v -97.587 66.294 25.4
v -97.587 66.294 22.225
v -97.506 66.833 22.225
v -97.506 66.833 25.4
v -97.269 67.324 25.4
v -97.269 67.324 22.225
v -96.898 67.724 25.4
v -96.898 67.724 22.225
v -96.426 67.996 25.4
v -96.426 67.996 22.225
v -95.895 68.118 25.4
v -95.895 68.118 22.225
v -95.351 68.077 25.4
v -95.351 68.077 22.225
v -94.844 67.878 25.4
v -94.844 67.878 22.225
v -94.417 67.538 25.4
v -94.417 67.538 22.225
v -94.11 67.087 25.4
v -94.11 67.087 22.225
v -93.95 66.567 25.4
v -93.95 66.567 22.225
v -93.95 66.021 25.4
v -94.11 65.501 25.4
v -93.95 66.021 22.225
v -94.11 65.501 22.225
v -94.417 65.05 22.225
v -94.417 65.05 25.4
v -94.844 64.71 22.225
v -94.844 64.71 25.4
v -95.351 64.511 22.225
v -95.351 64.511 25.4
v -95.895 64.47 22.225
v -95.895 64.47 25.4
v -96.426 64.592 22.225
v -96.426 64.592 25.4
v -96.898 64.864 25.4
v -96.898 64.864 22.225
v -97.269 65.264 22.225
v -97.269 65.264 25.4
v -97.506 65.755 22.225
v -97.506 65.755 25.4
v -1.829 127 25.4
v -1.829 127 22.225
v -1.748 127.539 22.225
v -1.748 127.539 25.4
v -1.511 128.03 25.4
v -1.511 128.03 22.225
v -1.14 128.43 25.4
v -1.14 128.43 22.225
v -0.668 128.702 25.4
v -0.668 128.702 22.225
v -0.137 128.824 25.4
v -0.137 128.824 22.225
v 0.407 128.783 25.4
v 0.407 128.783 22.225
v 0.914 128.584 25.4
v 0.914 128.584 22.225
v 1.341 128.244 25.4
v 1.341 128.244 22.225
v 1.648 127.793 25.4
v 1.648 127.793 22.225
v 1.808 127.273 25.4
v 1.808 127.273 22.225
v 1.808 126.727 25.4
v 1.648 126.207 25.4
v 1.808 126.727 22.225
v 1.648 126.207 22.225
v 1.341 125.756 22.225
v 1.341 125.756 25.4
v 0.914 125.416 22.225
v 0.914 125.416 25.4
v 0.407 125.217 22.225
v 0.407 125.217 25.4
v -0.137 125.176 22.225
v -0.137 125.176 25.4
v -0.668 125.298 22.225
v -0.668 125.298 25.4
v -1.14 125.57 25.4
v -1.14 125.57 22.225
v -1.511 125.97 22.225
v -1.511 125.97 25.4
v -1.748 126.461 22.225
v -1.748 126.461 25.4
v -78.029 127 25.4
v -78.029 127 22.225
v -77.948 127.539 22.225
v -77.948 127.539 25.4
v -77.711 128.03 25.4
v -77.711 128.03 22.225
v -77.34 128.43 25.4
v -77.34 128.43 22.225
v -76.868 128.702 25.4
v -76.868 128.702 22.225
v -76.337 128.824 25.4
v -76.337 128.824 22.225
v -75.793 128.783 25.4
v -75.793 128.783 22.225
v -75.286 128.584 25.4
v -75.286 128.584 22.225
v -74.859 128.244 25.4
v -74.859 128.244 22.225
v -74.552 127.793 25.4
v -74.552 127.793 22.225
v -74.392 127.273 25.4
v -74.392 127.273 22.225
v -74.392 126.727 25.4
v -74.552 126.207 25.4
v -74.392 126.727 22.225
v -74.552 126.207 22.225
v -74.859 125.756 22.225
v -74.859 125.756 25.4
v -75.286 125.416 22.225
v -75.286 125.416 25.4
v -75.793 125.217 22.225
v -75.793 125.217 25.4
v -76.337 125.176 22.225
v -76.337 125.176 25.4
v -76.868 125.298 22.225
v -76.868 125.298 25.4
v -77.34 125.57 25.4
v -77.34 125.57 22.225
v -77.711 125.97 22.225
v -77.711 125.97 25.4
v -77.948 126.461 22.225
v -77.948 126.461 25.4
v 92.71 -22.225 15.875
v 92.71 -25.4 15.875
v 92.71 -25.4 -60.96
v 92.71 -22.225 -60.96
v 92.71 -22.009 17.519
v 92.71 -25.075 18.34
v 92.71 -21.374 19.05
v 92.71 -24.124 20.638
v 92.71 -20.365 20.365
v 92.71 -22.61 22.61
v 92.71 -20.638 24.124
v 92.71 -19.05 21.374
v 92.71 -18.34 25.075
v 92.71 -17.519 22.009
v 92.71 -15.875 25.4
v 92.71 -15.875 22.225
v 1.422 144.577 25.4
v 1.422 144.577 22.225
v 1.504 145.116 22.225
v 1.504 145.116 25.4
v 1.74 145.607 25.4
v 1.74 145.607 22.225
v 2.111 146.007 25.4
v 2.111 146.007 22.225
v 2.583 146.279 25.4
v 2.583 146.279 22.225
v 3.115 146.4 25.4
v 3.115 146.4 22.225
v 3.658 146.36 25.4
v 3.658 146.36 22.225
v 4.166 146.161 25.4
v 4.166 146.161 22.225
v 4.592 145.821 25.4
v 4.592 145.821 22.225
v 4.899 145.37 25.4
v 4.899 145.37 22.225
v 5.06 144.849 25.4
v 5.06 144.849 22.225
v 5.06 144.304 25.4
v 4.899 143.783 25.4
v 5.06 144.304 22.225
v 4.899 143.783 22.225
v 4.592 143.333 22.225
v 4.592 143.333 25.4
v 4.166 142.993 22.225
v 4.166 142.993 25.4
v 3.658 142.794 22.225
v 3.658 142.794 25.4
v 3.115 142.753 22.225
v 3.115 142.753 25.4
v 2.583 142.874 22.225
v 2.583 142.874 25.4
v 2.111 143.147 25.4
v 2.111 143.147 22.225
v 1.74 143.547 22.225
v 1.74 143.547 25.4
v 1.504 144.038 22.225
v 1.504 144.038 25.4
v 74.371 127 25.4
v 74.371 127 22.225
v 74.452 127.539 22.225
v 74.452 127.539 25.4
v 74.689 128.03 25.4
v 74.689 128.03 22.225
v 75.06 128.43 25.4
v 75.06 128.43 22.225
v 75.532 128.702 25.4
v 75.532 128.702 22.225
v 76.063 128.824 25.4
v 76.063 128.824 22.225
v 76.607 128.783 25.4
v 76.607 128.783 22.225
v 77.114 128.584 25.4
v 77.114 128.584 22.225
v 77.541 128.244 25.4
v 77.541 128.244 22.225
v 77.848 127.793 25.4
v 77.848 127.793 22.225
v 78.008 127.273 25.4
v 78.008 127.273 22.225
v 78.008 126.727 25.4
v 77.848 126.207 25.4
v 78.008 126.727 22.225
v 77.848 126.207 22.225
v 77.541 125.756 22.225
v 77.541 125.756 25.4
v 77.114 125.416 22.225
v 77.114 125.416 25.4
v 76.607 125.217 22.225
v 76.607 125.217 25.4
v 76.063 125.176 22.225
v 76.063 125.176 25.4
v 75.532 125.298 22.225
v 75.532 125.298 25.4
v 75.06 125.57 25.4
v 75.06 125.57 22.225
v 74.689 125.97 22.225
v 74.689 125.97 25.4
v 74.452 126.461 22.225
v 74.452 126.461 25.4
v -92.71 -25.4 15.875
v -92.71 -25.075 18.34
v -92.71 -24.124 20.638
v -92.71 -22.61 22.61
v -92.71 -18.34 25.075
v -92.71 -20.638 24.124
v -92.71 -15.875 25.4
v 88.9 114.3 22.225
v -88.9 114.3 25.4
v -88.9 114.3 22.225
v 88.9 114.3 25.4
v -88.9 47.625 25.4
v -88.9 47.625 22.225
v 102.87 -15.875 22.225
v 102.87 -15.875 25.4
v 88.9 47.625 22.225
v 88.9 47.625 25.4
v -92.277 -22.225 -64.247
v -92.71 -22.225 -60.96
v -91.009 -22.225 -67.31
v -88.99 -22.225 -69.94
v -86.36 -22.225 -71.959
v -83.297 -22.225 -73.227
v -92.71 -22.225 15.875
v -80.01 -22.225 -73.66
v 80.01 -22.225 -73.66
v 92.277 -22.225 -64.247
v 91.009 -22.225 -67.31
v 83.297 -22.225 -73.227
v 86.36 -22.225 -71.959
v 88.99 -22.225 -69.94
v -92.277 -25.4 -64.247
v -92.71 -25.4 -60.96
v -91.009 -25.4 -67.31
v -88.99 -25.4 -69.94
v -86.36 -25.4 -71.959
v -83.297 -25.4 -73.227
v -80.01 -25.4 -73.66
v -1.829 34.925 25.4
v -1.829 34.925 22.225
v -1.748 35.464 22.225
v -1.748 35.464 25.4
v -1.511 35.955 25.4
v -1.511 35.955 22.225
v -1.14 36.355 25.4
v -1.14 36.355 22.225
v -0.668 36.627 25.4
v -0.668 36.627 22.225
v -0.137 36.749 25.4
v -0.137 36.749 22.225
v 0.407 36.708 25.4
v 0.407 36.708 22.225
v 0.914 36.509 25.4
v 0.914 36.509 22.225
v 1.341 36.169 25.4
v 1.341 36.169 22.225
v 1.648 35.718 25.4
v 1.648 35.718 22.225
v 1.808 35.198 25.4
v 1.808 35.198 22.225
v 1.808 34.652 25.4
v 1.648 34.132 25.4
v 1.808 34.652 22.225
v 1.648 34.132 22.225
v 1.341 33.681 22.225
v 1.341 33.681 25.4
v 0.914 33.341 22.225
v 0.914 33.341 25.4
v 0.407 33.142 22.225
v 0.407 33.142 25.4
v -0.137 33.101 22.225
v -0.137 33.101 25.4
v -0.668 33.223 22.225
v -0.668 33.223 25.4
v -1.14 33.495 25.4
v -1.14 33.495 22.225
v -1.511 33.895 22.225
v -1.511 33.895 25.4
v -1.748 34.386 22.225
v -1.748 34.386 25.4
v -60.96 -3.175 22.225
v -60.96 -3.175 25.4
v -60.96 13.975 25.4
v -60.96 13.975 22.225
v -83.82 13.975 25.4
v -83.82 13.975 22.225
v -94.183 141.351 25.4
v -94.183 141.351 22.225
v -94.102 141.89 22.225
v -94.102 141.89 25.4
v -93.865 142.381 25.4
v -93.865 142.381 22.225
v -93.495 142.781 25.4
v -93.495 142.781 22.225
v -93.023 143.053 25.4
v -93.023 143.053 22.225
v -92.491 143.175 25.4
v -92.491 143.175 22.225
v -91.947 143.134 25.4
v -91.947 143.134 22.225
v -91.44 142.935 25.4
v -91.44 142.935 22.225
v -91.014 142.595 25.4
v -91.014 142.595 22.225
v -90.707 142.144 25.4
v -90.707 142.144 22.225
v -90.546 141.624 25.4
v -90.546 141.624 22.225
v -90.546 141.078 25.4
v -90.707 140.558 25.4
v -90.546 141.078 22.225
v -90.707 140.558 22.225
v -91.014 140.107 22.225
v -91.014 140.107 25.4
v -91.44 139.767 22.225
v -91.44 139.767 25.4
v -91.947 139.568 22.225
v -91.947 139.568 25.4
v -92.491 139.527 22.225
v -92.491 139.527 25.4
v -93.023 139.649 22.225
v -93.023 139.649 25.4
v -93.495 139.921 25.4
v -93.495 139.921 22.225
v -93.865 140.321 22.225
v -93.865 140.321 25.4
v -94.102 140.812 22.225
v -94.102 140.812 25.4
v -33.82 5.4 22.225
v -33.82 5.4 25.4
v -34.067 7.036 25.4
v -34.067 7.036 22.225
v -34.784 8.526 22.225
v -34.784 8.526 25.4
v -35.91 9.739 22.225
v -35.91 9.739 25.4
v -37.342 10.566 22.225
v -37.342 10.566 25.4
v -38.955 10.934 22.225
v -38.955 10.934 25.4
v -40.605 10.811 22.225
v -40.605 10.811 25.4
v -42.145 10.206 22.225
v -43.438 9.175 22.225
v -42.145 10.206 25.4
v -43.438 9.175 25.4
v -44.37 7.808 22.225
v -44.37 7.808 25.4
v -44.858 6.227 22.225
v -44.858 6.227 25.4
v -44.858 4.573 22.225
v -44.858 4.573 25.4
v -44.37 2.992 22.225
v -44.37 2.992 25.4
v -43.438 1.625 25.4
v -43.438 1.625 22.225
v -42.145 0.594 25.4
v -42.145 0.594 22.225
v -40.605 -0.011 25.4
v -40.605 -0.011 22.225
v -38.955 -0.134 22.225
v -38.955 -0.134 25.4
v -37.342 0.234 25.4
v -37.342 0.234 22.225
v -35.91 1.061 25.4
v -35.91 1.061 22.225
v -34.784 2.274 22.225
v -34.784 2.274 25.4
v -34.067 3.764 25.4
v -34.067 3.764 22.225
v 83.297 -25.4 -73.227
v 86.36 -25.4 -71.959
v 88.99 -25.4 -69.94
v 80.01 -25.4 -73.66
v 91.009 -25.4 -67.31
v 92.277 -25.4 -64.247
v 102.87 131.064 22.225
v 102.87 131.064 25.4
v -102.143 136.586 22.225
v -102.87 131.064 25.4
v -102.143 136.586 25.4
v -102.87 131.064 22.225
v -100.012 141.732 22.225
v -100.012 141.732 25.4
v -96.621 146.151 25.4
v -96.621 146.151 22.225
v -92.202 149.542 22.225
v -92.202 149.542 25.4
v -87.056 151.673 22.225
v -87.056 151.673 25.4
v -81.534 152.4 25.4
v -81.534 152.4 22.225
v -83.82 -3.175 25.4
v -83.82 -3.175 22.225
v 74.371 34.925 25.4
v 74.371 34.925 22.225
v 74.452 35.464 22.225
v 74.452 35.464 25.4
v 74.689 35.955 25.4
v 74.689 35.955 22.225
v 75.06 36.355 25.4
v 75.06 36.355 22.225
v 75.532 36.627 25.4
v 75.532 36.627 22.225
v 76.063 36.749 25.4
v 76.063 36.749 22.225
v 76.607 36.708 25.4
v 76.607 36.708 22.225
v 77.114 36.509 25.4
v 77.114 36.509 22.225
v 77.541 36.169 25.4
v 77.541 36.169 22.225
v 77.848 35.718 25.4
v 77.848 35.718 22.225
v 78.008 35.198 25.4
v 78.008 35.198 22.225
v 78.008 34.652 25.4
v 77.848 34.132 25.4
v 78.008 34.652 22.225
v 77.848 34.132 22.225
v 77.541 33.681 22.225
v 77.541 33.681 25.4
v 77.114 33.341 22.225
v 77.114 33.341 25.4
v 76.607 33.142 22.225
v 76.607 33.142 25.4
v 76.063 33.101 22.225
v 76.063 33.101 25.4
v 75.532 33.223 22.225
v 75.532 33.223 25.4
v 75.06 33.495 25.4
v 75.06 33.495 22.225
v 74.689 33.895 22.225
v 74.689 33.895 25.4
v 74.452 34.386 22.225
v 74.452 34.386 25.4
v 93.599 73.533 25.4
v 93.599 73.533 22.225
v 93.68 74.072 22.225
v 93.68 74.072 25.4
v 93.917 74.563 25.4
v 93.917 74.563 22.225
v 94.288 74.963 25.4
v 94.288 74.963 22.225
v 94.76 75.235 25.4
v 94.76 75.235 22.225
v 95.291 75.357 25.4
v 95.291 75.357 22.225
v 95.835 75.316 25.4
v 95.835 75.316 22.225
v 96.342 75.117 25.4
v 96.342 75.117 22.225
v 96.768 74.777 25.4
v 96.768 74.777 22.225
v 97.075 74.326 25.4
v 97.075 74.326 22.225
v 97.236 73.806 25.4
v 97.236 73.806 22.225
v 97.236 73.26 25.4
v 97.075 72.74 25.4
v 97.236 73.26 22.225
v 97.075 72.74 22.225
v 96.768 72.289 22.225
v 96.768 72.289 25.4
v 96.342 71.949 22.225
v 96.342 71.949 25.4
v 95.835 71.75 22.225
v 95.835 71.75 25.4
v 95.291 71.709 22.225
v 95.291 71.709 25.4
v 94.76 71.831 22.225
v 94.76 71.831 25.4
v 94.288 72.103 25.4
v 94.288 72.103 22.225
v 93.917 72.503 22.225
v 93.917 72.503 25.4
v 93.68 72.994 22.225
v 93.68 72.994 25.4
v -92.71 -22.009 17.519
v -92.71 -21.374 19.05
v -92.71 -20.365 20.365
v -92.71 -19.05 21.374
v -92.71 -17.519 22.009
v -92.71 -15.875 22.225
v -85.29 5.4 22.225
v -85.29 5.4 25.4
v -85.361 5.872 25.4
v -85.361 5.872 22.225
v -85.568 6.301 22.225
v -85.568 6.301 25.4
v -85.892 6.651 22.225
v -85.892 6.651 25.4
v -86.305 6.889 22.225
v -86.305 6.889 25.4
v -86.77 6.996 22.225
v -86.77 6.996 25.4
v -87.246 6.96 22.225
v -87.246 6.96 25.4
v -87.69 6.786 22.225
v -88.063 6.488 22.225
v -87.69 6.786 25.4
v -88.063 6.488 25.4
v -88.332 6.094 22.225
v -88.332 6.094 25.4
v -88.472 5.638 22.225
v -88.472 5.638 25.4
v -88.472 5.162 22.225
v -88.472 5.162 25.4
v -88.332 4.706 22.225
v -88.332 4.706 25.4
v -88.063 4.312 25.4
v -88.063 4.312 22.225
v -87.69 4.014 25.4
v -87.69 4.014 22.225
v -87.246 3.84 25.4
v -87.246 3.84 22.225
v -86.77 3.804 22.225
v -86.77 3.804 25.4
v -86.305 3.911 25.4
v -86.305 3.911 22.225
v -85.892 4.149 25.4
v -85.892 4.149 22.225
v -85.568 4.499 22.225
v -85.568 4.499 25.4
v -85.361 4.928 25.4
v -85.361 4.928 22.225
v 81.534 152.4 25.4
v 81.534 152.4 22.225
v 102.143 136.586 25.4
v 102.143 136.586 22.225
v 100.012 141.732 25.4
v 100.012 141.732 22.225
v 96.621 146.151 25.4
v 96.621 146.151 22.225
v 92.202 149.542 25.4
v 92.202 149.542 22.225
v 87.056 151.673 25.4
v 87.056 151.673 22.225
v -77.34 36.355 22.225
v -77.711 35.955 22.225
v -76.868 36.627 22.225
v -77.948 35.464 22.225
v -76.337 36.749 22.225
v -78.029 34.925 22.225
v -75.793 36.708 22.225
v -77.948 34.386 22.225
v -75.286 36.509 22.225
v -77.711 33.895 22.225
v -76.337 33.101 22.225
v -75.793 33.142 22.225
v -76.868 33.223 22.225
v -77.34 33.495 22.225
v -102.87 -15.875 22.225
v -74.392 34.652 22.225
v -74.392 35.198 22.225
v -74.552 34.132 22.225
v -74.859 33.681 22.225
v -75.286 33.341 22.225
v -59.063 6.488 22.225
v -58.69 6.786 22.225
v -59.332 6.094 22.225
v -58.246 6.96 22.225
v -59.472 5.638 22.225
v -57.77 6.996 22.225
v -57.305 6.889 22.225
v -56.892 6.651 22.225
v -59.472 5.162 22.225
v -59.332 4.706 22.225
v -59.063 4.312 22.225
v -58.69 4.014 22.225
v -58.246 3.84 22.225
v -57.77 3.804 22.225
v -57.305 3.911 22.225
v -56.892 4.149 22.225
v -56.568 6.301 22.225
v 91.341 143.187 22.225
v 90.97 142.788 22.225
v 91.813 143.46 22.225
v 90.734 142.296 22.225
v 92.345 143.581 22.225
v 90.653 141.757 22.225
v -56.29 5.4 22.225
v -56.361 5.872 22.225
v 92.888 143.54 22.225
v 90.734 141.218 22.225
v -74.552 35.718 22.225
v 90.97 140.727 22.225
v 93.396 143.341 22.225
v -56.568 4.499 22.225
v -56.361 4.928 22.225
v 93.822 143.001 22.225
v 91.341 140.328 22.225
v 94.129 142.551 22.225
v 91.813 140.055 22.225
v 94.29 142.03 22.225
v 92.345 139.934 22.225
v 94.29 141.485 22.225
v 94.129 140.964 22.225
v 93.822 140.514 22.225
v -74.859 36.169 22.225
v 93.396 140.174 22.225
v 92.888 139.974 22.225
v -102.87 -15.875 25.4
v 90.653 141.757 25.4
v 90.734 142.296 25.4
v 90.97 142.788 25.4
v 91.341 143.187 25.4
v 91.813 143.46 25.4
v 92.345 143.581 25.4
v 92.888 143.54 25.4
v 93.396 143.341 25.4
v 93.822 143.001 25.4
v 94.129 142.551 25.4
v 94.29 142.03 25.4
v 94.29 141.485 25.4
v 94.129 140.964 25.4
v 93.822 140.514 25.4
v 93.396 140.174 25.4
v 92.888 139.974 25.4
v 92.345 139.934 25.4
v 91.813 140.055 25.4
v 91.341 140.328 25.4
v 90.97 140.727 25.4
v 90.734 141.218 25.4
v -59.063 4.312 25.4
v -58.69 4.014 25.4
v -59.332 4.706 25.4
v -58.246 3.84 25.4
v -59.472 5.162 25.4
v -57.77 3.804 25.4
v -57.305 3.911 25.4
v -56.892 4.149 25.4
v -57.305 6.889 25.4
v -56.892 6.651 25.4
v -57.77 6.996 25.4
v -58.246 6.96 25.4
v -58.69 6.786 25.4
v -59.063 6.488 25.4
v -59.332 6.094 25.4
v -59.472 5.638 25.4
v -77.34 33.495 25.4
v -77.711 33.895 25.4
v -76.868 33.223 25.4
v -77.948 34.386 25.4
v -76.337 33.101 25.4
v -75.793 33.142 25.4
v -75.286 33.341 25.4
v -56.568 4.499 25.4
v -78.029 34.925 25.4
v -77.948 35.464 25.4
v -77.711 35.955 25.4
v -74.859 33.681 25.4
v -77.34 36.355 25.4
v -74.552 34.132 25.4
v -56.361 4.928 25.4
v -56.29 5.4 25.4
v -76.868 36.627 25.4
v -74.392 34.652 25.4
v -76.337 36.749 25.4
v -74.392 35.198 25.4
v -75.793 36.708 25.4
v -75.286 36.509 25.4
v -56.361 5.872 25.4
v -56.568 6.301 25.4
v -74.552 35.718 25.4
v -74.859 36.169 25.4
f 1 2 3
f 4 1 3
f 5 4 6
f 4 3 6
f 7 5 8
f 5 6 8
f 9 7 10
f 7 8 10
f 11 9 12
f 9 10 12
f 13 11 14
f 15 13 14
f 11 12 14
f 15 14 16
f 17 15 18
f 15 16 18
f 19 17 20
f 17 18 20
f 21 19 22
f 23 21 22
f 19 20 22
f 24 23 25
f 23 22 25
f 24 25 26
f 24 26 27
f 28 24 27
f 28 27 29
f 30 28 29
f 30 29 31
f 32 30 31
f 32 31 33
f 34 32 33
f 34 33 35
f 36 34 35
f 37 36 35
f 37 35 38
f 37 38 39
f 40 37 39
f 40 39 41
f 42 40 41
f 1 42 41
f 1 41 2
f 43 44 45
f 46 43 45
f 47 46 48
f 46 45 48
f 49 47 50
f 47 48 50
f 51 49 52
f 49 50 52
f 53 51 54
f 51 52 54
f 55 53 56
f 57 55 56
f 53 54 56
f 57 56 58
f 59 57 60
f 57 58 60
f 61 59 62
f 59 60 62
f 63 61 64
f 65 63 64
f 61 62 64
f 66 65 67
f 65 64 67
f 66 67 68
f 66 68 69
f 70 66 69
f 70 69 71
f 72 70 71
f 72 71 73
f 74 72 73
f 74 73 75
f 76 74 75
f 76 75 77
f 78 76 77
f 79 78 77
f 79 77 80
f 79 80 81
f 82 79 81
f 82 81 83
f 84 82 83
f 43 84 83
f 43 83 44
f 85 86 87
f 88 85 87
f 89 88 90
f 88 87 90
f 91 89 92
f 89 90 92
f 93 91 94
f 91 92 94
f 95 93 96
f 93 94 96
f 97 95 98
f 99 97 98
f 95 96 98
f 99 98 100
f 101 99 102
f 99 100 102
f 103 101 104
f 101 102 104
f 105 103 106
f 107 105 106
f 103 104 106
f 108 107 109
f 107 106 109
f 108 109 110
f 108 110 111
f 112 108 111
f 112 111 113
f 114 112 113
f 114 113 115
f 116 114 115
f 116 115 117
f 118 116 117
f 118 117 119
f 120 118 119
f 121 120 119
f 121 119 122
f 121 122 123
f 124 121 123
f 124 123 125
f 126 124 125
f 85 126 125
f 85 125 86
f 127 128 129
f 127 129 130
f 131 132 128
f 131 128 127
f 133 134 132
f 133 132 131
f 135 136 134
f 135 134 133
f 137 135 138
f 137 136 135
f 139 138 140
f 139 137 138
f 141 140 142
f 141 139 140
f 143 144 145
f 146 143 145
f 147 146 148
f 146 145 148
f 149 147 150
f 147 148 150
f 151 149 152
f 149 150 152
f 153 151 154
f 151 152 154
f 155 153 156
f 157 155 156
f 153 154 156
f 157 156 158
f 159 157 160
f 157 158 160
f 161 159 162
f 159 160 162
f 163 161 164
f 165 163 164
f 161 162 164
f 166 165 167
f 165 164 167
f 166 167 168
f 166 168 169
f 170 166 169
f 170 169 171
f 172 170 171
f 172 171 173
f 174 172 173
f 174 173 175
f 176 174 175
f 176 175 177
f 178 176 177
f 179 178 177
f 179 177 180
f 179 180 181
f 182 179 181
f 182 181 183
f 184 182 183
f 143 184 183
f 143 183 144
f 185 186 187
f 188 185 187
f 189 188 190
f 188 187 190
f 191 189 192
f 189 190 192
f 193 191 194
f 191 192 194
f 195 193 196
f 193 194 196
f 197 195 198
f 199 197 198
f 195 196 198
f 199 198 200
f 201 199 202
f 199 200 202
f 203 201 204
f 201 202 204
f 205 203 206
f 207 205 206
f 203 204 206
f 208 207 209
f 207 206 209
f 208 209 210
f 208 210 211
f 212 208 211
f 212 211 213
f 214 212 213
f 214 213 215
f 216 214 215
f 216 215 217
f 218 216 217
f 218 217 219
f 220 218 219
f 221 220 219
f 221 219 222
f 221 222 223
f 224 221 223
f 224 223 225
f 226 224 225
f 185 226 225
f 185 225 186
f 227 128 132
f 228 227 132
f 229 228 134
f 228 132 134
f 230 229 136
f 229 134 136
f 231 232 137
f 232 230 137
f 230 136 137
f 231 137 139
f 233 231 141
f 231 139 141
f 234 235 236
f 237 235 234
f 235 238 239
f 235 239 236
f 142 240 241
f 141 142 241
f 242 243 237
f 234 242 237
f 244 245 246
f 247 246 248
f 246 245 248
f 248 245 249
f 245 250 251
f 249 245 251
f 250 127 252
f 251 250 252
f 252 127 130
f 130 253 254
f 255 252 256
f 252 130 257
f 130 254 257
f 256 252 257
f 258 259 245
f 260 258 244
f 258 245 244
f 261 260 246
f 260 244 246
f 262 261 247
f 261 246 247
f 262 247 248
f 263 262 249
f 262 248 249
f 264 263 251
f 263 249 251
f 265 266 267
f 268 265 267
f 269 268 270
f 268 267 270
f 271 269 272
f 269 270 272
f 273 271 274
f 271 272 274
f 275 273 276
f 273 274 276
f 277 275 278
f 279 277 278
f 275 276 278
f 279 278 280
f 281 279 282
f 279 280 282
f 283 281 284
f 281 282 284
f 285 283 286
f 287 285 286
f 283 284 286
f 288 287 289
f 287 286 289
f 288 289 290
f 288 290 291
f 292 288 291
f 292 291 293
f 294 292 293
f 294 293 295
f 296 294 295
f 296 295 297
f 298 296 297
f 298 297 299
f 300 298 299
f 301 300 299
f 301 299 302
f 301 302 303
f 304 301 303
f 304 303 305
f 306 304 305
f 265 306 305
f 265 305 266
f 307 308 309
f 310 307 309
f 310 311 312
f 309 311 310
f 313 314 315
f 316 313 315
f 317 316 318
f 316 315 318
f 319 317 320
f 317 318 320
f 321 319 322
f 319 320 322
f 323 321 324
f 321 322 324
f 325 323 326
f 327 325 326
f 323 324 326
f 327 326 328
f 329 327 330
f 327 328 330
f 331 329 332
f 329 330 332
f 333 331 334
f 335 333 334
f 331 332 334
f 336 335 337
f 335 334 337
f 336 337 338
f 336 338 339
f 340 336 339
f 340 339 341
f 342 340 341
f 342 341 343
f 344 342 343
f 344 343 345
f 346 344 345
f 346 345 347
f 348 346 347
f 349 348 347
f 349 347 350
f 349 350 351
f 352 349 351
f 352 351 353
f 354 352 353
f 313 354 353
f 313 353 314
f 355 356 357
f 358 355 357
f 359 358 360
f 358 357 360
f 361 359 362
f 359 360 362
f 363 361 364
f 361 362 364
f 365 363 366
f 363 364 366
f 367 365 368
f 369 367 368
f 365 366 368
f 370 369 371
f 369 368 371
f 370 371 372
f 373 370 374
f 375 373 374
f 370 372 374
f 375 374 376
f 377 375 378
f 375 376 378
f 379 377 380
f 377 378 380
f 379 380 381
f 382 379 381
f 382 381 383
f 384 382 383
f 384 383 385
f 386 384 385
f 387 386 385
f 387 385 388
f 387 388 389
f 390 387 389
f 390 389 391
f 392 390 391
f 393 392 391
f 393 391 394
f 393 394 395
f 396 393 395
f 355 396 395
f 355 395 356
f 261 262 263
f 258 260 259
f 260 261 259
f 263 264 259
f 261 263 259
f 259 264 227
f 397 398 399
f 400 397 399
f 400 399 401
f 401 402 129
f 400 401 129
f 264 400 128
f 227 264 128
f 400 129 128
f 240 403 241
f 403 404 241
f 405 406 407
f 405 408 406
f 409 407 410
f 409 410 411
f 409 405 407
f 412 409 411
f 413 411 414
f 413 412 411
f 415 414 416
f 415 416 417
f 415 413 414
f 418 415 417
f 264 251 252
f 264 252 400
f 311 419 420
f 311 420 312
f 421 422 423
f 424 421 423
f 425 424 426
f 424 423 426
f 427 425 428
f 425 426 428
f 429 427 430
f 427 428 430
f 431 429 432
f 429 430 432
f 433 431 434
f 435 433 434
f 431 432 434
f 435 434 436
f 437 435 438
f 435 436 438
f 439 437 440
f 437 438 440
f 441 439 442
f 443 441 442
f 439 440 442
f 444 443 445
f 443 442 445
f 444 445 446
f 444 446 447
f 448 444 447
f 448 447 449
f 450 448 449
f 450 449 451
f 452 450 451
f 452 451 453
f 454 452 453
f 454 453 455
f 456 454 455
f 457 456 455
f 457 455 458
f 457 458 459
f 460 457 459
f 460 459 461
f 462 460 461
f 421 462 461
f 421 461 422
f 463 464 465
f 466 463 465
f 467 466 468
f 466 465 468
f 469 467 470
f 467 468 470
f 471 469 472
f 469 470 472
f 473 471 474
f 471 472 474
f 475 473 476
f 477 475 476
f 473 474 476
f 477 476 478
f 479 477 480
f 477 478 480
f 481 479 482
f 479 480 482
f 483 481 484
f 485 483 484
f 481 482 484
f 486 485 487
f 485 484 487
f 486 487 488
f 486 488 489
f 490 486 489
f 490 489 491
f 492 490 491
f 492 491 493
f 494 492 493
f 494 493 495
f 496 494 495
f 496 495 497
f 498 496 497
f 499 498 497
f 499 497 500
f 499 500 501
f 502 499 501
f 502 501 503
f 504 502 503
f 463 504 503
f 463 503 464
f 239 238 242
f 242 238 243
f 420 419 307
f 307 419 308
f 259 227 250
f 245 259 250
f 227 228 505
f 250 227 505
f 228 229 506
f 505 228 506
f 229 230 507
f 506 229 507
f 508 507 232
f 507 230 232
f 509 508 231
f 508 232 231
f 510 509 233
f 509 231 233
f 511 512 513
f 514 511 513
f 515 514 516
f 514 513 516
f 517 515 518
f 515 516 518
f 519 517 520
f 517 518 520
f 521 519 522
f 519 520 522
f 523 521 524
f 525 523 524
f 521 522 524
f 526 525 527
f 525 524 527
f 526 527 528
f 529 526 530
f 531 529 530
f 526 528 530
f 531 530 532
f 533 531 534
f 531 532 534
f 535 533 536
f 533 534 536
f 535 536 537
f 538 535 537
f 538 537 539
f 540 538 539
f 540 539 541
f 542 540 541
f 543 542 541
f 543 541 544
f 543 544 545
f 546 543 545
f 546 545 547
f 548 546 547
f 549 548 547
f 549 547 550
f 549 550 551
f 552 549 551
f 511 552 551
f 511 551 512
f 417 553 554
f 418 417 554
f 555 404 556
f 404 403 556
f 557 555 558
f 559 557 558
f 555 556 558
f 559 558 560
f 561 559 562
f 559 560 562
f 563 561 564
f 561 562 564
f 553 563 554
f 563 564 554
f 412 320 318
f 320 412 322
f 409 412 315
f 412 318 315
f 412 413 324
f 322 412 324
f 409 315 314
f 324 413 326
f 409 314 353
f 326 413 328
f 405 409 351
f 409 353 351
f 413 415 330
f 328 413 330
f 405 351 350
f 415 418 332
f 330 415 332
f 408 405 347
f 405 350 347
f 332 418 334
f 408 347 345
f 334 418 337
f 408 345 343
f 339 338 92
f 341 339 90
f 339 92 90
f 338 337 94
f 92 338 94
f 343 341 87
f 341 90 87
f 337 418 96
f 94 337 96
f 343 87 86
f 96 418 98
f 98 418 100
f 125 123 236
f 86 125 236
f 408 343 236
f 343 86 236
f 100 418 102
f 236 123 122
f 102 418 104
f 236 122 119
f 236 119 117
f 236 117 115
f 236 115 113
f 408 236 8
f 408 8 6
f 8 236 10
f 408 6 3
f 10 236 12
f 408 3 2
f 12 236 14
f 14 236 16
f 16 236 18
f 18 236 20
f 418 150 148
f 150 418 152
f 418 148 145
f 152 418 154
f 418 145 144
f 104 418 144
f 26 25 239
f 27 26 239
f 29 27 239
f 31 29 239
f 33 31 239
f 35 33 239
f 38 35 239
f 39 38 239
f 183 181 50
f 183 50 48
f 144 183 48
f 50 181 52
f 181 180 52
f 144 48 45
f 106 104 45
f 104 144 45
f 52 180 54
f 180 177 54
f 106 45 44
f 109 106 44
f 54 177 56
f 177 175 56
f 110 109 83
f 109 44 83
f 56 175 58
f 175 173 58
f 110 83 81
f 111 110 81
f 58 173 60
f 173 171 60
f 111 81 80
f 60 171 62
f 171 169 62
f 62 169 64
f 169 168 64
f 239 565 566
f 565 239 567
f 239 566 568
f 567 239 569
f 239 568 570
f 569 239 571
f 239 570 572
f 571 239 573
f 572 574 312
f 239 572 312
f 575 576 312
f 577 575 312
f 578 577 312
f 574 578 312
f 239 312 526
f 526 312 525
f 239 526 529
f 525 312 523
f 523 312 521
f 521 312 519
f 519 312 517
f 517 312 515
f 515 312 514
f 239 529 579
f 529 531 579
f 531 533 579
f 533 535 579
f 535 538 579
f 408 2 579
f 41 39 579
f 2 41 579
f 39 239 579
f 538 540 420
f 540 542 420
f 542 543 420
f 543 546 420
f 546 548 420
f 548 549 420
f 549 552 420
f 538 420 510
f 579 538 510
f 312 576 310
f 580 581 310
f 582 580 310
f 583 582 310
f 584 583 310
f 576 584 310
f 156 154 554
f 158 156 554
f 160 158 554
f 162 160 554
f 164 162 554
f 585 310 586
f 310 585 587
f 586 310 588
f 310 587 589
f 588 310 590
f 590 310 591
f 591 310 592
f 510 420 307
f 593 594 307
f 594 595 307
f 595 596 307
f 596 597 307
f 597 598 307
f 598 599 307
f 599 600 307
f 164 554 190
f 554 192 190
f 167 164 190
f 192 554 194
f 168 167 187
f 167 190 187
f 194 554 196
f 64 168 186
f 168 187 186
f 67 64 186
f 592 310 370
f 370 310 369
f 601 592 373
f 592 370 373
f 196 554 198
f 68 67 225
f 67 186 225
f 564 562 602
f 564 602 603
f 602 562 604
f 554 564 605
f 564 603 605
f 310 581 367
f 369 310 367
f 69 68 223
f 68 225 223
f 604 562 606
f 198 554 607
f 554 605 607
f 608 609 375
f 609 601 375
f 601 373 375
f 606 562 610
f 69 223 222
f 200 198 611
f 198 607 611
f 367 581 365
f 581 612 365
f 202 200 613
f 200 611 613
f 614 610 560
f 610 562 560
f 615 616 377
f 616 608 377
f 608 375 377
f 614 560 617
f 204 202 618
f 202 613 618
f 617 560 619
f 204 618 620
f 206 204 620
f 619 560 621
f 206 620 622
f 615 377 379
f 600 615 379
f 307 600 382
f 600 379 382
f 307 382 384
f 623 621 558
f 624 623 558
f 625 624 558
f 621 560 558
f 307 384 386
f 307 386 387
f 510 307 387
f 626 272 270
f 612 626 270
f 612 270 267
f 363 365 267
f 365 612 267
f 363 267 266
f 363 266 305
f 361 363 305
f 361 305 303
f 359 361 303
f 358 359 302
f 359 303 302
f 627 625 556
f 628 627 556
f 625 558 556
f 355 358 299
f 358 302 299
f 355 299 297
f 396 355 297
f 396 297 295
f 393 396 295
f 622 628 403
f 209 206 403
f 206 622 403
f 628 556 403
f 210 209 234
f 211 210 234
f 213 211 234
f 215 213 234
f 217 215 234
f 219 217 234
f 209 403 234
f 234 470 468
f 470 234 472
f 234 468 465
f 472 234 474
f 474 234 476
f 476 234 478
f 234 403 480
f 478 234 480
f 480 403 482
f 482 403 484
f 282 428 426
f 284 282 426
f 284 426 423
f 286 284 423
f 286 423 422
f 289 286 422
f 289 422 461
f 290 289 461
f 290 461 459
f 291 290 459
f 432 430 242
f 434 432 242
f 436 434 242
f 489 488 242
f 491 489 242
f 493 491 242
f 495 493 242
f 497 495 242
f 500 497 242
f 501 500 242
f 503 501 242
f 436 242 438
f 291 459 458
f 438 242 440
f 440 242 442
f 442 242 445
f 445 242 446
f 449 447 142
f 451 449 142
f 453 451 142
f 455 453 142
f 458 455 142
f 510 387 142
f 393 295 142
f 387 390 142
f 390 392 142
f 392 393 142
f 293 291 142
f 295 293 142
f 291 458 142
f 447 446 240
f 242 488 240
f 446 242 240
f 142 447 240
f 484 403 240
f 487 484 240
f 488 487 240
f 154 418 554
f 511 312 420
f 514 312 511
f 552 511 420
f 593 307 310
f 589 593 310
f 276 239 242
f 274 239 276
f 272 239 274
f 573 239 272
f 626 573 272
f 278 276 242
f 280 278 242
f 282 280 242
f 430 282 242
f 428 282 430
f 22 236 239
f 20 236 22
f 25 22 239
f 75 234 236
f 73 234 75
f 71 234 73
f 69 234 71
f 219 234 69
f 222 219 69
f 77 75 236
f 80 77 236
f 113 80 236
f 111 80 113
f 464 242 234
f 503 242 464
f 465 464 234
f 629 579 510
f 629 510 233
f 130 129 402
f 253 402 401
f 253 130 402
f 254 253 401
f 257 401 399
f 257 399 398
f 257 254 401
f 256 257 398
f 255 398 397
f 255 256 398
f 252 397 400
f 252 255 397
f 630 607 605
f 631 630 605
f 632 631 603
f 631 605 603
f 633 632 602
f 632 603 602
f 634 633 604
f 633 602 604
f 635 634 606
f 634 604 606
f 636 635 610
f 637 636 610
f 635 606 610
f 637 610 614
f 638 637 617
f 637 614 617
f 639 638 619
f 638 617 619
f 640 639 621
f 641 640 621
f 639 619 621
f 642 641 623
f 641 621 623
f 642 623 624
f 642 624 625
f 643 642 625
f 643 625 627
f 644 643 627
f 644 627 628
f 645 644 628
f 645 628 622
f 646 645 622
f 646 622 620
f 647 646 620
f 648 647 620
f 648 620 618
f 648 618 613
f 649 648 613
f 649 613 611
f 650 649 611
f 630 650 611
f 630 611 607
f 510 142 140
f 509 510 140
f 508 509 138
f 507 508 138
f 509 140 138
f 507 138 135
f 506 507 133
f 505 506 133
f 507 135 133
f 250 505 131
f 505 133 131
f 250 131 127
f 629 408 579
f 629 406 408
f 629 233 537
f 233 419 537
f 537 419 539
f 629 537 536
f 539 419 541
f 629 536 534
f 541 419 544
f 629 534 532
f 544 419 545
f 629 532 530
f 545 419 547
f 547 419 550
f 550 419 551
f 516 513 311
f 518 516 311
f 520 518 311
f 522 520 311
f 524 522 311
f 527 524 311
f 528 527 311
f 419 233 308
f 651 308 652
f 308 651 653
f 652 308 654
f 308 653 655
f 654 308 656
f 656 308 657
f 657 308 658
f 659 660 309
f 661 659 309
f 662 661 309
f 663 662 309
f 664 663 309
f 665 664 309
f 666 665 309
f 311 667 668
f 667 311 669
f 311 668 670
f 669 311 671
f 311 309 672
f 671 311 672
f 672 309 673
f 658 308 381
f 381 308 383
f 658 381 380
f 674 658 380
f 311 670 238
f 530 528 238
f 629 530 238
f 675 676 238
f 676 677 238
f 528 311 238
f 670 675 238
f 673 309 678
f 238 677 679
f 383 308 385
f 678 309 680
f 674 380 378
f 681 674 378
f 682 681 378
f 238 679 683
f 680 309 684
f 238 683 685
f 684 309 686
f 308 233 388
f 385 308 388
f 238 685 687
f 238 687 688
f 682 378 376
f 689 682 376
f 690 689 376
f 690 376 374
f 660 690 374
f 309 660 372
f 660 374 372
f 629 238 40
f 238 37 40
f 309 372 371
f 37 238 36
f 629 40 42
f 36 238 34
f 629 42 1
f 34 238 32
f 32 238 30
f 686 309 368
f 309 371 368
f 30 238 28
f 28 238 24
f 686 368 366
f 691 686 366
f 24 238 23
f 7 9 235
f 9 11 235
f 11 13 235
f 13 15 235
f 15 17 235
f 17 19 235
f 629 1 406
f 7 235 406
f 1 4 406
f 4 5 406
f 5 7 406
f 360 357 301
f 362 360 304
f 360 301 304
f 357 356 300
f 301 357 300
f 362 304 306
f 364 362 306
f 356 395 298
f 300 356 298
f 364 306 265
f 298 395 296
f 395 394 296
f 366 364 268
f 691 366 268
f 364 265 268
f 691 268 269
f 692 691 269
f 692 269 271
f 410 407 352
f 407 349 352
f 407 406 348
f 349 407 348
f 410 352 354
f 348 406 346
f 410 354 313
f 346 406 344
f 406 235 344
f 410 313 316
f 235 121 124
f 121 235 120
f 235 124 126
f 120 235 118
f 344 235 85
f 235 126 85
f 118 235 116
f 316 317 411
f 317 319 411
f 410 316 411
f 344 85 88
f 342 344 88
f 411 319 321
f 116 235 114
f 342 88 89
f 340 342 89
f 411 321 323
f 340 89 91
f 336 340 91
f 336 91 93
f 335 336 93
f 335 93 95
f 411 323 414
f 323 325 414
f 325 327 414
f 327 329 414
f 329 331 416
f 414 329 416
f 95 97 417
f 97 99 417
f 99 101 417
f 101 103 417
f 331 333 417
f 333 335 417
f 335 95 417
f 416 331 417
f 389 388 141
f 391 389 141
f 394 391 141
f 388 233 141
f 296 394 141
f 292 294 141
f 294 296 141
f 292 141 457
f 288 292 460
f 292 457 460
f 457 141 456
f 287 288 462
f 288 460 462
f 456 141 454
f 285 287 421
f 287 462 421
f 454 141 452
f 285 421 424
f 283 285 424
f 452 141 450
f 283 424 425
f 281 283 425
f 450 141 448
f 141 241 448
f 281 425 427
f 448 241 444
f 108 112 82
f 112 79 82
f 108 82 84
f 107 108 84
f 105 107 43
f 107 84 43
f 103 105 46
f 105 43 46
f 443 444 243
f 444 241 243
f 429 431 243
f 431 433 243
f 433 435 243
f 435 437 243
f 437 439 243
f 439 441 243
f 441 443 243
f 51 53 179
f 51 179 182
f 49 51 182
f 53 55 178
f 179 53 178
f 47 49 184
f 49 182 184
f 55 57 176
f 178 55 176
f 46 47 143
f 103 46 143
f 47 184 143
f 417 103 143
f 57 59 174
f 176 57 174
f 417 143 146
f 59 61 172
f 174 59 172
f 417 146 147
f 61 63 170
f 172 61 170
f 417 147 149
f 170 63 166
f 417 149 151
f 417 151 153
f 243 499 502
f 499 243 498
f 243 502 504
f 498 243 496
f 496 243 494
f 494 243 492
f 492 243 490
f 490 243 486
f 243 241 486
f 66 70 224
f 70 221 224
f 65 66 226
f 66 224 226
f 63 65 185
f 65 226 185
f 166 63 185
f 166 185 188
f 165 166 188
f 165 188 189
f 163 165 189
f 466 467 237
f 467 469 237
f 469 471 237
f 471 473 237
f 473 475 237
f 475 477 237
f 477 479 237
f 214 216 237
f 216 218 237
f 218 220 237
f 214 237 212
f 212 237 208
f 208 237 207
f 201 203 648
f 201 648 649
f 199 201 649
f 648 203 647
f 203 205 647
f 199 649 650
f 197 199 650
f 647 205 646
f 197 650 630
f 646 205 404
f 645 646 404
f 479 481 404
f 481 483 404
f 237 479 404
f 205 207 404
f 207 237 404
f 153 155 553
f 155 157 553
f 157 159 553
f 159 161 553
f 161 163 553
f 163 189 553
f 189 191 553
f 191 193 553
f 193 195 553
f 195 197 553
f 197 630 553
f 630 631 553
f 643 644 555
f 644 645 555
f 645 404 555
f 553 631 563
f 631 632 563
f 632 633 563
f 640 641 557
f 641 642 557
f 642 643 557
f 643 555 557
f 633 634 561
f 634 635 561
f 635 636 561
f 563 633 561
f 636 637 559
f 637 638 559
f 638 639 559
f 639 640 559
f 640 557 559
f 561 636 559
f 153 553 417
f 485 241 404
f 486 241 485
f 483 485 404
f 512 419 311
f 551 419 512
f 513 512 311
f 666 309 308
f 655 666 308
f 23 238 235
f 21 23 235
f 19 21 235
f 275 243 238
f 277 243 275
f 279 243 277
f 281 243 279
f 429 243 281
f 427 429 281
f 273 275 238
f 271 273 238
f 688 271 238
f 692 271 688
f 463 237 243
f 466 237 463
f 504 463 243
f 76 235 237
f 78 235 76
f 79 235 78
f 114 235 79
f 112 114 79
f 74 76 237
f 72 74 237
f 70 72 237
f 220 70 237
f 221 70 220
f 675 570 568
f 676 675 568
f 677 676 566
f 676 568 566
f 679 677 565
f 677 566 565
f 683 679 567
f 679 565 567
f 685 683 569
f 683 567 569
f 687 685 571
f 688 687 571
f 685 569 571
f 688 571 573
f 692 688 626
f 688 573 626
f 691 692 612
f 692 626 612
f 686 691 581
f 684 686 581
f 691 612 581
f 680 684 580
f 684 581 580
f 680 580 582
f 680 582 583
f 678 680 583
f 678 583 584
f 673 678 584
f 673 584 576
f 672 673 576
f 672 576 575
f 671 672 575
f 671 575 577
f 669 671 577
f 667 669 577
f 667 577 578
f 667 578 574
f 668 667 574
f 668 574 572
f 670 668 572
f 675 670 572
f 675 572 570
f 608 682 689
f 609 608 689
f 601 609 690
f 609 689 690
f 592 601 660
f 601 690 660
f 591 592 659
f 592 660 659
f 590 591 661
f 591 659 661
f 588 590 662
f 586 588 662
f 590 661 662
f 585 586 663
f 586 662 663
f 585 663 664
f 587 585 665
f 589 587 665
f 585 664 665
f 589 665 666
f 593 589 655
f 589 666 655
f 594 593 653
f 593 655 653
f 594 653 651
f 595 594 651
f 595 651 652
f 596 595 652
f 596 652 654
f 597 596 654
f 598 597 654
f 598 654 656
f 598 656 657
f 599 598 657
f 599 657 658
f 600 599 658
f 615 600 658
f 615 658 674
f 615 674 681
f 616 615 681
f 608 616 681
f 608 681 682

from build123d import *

# Parameters (mm, degrees)
BASE_FLANGE1_DEPTH          = 102.87
SKETCH6_W                   = 9.525
SKETCH6_H                   = 99.06
CUT_EXTRUDE1_DEPTH          = 10.16
FILLET1_R                   = 21.336
FILLET2_R                   = 12.7
SKETCH8_W                   = 177.8
SKETCH8_H                   = 66.675
CUT_EXTRUDE2_DEPTH          = 10.16
F_27_0_144_DIAMETER_HOLE1_D = 3.6576
F_27_0_144_DIAMETER_HOLE2_D = 3.6576
CUT_EXTRUDE3_REACH          = 210.856
SKETCH17_R                  = 1.6
SKETCH17_W                  = 22.86
SKETCH17_H                  = 17.15
CUT_EXTRUDE4_REACH          = 210.856
SKETCH18_R                  = 5.5499


# Sheet-metal steps are written as plain solids
with BuildPart() as part:
    # Sketch1 → Base-Flange1 (new, symmetric)
    with BuildSketch(Plane.YZ):
        with BuildLine():
            Line((-25.4, -73.66), (-25.4, 15.875))
            ThreePointArc((-25.4, 15.875), (-22.610192091, 22.610192091), (-15.875, 25.4))
            Line((-15.875, 25.4), (152.4, 25.4))
            Line((152.4, 25.4), (152.4, 22.225))
            Line((152.4, 22.225), (-15.875, 22.225))
            ThreePointArc((-15.875, 22.225), (-20.365128061, 20.365128061), (-22.225, 15.875))
            Line((-22.225, 15.875), (-22.225, -73.66))
            Line((-22.225, -73.66), (-25.4, -73.66))
        make_face()
    extrude(amount=BASE_FLANGE1_DEPTH, both=True)

    # Sketch6 → Cut-Extrude1 (cut)
    with BuildSketch(Plane.YZ.offset(102.87)):
        with Locations((-20.6375, -24.13)):
            Rectangle(SKETCH6_W, SKETCH6_H)
    cut_extrude1 = extrude(amount=-CUT_EXTRUDE1_DEPTH, mode=Mode.SUBTRACT)

    # Mirror1: Cut-Extrude1 across plane
    add(cut_extrude1.mirror(Plane(origin=(0, 0, 0), x_dir=(0, 0, 1), z_dir=(1, 0, 0))), mode=Mode.SUBTRACT)

    # Fillet1
    fillet1_edges = [part.edges().sort_by_distance(p)[0] for p in [
        (102.87, 152.4, 23.8125),
        (-102.87, 152.4, 23.8125),
    ]]
    fillet(fillet1_edges, radius=FILLET1_R)

    # Fillet2
    fillet2_edges = [part.edges().sort_by_distance(p)[0] for p in [
        (92.71, -23.8125, -73.66),
        (-92.71, -23.8125, -73.66),
    ]]
    fillet(fillet2_edges, radius=FILLET2_R)

    # Sketch8 → Cut-Extrude2 (cut)
    with BuildSketch(Plane.XY.offset(25.4)):
        with Locations((0, 80.9625)):
            Rectangle(SKETCH8_W, SKETCH8_H)
    extrude(amount=-CUT_EXTRUDE2_DEPTH, mode=Mode.SUBTRACT)

    # #27 (0.144) Diameter Hole1 (through all)
    with Locations(Plane.XY.offset(25.4)):
        with Locations((-76.2, 127), (0, 127), (76.2, 127), (76.2, 34.925), (0, 34.925), (-76.2, 34.925)):
            Hole(F_27_0_144_DIAMETER_HOLE1_D / 2)

    # #27 (0.144) Diameter Hole2 (through all)
    with Locations(Plane.XY.offset(25.4)):
        with Locations((92.4814, 141.7574), (95.4278, 73.533), (95.4278, -25.273), (-95.758, -18.034), (-95.758, 66.294), (-92.3544, 141.351), (3.2512, 144.5768)):
            Hole(F_27_0_144_DIAMETER_HOLE2_D / 2)

    # Sketch17 → Cut-Extrude3 (cut, up to next)
    with BuildSketch(Plane.XY.offset(25.4), mode=Mode.PRIVATE) as cut_extrude3_sk1:
        with Locations((-86.89, 5.4)):
            Circle(SKETCH17_R)
    cut_extrude3_tool1 = extrude(cut_extrude3_sk1.sketch, amount=-CUT_EXTRUDE3_REACH, mode=Mode.PRIVATE) & part.part
    # Sketch17 → Cut-Extrude3 (cut, up to next)
    with BuildSketch(Plane.XY.offset(25.4), mode=Mode.PRIVATE) as cut_extrude3_sk2:
        with Locations((-57.89, 5.4)):
            Circle(SKETCH17_R)
    cut_extrude3_tool2 = extrude(cut_extrude3_sk2.sketch, amount=-CUT_EXTRUDE3_REACH, mode=Mode.PRIVATE) & part.part
    # Sketch17 → Cut-Extrude3 (cut, up to next)
    with BuildSketch(Plane.XY.offset(25.4), mode=Mode.PRIVATE) as cut_extrude3_sk3:
        with Locations((-72.39, 5.4)):
            Rectangle(SKETCH17_W, SKETCH17_H)
    cut_extrude3_tool3 = extrude(cut_extrude3_sk3.sketch, amount=-CUT_EXTRUDE3_REACH, mode=Mode.PRIVATE) & part.part
    add(cut_extrude3_tool1.solids().sort_by_distance((-86.89, 5.4, 25.4))[0], mode=Mode.SUBTRACT)
    add(cut_extrude3_tool2.solids().sort_by_distance((-57.89, 5.4, 25.4))[0], mode=Mode.SUBTRACT)
    add(cut_extrude3_tool3.solids().sort_by_distance((-72.39, 5.4, 25.4))[0], mode=Mode.SUBTRACT)

    # Sketch18 → Cut-Extrude4 (cut, up to next)
    with BuildSketch(Plane.XY.offset(25.4), mode=Mode.PRIVATE) as cut_extrude4_sk1:
        with Locations((-39.37, 5.4)):
            Circle(SKETCH18_R)
    cut_extrude4_tool1 = extrude(cut_extrude4_sk1.sketch, amount=-CUT_EXTRUDE4_REACH, mode=Mode.PRIVATE) & part.part
    add(cut_extrude4_tool1.solids().sort_by_distance((-39.37, 5.4, 25.4))[0], mode=Mode.SUBTRACT)


solid = part.part
